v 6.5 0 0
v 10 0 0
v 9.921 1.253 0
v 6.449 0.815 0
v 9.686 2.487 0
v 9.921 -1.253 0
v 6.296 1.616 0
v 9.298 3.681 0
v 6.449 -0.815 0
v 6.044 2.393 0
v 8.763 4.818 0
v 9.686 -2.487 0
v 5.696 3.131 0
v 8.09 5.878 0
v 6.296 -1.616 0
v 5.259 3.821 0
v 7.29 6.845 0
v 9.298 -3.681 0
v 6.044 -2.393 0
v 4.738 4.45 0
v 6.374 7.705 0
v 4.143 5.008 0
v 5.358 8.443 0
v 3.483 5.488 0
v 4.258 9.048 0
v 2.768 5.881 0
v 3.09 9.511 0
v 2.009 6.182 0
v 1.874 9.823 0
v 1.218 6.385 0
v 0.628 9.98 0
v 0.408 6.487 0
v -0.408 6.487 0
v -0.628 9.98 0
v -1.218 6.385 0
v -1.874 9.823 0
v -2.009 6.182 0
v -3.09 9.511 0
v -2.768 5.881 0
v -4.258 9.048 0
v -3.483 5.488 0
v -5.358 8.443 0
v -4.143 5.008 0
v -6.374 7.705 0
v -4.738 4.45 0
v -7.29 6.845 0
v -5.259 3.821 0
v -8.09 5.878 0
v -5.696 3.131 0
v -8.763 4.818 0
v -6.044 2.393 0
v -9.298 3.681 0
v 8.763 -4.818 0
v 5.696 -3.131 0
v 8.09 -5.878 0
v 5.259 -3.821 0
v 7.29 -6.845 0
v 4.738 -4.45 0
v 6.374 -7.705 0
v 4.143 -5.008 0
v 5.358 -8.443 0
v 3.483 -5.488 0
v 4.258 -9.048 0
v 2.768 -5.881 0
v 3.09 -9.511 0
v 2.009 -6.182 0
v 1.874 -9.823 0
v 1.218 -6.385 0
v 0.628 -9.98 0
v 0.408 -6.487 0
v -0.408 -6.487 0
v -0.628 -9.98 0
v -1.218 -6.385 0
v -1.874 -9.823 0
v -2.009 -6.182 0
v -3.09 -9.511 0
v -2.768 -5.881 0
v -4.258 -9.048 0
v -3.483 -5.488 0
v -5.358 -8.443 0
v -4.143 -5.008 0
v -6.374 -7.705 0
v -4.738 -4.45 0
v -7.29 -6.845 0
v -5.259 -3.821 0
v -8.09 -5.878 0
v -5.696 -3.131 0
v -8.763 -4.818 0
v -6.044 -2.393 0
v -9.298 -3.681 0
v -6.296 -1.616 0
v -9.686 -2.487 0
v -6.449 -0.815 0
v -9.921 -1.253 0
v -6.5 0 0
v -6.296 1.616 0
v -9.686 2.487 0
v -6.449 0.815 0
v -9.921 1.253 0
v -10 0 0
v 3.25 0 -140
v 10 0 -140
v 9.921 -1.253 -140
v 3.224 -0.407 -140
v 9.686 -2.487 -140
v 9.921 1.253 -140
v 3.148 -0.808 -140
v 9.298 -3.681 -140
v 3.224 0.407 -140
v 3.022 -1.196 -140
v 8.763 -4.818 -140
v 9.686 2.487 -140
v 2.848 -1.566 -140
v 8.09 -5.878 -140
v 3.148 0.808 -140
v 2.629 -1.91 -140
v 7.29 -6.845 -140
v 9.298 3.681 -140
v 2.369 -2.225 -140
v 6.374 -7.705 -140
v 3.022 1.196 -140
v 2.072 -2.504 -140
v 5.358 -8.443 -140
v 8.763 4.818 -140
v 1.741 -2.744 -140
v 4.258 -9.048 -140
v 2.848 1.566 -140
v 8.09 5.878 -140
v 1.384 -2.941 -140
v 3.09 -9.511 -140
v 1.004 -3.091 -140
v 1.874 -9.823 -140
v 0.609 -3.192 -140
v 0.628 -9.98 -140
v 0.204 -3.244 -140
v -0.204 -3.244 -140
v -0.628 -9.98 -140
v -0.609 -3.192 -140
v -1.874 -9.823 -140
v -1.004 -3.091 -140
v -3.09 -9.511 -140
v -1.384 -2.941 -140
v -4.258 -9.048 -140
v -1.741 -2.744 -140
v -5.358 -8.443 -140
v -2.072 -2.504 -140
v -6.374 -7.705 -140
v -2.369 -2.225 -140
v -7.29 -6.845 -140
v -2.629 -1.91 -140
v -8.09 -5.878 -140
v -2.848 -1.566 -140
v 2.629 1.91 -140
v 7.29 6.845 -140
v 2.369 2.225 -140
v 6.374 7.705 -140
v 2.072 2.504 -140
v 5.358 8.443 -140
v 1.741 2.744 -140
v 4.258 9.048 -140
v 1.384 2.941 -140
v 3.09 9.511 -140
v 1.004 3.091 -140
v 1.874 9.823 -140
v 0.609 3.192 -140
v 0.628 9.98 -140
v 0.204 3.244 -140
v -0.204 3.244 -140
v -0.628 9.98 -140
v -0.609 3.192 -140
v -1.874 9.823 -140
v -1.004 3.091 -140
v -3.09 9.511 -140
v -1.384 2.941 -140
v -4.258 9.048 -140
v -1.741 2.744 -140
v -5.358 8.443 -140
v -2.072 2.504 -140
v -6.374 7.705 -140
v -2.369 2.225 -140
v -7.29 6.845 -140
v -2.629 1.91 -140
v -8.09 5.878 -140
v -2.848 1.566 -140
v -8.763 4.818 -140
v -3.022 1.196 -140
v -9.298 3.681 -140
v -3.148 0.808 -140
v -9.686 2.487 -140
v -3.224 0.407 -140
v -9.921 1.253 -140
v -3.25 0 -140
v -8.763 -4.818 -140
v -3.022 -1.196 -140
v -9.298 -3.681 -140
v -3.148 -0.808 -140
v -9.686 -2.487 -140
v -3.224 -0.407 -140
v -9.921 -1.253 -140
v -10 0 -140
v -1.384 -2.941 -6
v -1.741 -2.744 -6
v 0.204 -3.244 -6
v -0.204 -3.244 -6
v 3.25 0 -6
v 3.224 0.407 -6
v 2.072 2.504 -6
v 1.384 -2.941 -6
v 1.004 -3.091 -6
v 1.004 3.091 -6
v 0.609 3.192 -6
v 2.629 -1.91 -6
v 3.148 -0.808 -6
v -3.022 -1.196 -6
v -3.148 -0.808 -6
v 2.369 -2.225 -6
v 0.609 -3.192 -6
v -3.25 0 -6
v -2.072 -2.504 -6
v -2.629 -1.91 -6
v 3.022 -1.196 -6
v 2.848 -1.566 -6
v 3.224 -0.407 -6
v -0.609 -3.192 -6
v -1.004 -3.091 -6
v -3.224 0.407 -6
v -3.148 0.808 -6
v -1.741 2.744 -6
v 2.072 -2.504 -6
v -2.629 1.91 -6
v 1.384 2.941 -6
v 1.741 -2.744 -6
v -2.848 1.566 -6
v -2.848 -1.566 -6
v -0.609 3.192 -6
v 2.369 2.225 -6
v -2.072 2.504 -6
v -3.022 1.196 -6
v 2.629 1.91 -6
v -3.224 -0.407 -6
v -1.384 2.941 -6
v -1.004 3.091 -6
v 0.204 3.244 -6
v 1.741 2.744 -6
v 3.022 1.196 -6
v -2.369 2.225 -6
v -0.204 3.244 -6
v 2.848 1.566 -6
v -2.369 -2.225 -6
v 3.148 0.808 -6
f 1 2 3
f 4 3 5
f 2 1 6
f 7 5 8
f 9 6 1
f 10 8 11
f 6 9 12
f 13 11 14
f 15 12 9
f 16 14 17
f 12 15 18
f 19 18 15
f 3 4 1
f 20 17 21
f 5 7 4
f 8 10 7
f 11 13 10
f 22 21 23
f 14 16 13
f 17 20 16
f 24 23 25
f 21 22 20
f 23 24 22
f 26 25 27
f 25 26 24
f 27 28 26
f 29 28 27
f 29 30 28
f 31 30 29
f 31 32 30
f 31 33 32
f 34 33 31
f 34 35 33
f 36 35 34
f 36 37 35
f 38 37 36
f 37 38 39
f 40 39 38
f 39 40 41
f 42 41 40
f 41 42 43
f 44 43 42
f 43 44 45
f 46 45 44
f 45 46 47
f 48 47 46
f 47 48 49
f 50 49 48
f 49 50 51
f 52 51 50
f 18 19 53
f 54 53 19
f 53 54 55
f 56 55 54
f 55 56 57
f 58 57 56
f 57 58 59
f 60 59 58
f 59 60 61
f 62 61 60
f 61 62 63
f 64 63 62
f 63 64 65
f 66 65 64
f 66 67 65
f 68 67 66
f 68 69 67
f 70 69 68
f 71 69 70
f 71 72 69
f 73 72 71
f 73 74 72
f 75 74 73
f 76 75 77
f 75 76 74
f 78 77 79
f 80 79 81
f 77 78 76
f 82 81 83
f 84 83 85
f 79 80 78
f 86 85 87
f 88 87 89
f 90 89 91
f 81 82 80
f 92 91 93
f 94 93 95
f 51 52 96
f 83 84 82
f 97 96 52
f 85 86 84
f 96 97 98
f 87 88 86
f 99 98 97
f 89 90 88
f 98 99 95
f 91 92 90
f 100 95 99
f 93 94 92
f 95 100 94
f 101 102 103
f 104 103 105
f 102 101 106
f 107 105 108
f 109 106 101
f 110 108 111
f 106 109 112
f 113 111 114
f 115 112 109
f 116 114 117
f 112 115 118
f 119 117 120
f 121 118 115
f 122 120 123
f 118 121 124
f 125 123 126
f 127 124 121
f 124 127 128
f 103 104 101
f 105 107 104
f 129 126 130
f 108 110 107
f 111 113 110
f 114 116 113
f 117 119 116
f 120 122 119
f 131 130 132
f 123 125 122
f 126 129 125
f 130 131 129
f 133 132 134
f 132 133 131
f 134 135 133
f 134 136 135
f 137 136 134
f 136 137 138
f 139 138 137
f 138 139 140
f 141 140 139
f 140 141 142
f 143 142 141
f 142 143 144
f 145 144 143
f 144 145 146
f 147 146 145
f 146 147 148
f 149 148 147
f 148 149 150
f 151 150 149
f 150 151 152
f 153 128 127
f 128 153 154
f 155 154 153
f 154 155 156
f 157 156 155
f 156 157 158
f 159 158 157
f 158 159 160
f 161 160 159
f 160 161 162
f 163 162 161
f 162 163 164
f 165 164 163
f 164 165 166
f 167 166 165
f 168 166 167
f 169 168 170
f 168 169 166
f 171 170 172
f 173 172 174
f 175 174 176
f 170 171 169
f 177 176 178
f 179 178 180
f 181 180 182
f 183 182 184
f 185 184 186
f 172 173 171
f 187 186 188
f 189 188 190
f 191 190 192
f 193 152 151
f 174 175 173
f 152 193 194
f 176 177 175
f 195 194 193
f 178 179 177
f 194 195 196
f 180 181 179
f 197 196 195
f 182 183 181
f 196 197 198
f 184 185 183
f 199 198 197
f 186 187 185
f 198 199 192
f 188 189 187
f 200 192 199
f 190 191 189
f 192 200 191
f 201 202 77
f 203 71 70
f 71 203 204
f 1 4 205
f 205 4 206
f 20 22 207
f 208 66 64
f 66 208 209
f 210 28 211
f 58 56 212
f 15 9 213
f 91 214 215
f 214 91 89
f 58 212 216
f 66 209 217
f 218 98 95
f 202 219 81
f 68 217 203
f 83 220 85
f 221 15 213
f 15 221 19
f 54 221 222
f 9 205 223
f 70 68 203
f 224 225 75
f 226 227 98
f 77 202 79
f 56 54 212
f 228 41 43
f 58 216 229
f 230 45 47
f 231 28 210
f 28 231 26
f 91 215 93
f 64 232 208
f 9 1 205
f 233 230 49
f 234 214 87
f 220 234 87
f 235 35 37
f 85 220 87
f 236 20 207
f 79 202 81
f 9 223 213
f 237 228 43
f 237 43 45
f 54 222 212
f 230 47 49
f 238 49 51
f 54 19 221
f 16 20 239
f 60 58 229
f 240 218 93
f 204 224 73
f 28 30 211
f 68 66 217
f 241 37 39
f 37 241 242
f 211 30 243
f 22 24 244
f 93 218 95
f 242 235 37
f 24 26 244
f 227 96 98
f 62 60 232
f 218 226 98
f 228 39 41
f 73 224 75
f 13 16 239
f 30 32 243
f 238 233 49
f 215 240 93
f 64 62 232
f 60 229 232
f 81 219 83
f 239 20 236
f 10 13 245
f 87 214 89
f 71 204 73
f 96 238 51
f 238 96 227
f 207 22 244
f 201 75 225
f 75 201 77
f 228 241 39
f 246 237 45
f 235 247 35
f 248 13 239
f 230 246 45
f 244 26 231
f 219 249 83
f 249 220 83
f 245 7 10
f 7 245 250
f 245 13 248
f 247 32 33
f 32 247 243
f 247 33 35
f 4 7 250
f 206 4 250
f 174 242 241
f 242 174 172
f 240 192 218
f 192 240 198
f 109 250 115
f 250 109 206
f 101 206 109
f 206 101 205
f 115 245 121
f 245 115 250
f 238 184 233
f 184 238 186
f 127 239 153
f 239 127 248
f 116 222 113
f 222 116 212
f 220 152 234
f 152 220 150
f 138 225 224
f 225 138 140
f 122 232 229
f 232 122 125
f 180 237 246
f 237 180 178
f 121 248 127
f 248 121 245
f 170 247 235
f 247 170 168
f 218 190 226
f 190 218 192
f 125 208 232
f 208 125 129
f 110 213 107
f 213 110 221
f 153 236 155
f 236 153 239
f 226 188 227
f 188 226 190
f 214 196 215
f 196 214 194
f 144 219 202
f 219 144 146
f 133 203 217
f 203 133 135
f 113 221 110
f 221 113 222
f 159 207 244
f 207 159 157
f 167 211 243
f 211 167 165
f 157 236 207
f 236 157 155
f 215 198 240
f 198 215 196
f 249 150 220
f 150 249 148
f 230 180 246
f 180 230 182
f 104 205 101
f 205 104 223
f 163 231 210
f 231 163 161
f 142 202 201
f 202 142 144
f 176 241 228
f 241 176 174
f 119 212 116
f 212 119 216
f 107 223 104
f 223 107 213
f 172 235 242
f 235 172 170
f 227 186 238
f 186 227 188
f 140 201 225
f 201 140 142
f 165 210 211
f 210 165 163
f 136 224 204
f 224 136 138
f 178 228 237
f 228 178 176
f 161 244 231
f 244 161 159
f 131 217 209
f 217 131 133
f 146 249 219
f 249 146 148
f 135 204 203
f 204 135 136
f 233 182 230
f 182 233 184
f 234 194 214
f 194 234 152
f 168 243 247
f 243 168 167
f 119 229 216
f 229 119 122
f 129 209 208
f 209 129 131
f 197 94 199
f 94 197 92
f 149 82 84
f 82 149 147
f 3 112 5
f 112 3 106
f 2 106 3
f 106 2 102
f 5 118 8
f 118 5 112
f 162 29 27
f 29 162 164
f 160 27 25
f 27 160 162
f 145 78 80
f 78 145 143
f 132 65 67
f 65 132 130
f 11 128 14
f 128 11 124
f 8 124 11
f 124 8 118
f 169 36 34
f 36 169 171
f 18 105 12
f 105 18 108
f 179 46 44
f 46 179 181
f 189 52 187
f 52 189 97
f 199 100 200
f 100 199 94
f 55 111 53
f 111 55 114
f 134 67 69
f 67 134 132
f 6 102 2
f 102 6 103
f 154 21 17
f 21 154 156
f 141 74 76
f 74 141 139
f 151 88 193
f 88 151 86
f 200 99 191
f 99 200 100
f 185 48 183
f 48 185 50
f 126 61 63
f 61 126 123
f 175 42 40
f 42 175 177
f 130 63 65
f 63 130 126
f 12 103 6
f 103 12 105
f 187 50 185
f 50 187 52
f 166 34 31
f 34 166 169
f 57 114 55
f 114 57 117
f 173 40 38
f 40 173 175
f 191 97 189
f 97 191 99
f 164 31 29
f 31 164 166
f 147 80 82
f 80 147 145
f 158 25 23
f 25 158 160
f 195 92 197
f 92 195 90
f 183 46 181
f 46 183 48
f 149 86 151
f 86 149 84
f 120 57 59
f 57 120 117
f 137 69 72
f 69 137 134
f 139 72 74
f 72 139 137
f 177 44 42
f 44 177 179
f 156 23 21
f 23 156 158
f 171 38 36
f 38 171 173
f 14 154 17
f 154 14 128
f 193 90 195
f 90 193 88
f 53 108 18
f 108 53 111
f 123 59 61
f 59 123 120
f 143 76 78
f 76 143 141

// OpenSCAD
$fn = 50;


difference() {
	union() {
		translate(v = [0, 0, -140.0000000000]) {
			cylinder(h = 140, r = 10.0000000000);
		}
		cylinder(h = 0, r = 16.0000000000);
	}
	union() {
		translate(v = [0, 0, 0]) {
			rotate(a = [0, 0, 0]) {
				difference() {
					union() {
						#translate(v = [0, 0, -140.0000000000]) {
							cylinder(h = 140, r = 2.2500000000);
						}
						#translate(v = [0, 0, -6]) {
							cylinder(h = 6, r = 10.0000000000, r1 = 3.2500000000, r2 = 6.5000000000);
						}
						#translate(v = [0, 0, -140.0000000000]) {
							cylinder(h = 140, r = 3.2500000000);
						}
						#translate(v = [0, 0, -140.0000000000]) {
							cylinder(h = 140, r = 2.2500000000);
						}
					}
					union();
				}
			}
		}
	}
}
